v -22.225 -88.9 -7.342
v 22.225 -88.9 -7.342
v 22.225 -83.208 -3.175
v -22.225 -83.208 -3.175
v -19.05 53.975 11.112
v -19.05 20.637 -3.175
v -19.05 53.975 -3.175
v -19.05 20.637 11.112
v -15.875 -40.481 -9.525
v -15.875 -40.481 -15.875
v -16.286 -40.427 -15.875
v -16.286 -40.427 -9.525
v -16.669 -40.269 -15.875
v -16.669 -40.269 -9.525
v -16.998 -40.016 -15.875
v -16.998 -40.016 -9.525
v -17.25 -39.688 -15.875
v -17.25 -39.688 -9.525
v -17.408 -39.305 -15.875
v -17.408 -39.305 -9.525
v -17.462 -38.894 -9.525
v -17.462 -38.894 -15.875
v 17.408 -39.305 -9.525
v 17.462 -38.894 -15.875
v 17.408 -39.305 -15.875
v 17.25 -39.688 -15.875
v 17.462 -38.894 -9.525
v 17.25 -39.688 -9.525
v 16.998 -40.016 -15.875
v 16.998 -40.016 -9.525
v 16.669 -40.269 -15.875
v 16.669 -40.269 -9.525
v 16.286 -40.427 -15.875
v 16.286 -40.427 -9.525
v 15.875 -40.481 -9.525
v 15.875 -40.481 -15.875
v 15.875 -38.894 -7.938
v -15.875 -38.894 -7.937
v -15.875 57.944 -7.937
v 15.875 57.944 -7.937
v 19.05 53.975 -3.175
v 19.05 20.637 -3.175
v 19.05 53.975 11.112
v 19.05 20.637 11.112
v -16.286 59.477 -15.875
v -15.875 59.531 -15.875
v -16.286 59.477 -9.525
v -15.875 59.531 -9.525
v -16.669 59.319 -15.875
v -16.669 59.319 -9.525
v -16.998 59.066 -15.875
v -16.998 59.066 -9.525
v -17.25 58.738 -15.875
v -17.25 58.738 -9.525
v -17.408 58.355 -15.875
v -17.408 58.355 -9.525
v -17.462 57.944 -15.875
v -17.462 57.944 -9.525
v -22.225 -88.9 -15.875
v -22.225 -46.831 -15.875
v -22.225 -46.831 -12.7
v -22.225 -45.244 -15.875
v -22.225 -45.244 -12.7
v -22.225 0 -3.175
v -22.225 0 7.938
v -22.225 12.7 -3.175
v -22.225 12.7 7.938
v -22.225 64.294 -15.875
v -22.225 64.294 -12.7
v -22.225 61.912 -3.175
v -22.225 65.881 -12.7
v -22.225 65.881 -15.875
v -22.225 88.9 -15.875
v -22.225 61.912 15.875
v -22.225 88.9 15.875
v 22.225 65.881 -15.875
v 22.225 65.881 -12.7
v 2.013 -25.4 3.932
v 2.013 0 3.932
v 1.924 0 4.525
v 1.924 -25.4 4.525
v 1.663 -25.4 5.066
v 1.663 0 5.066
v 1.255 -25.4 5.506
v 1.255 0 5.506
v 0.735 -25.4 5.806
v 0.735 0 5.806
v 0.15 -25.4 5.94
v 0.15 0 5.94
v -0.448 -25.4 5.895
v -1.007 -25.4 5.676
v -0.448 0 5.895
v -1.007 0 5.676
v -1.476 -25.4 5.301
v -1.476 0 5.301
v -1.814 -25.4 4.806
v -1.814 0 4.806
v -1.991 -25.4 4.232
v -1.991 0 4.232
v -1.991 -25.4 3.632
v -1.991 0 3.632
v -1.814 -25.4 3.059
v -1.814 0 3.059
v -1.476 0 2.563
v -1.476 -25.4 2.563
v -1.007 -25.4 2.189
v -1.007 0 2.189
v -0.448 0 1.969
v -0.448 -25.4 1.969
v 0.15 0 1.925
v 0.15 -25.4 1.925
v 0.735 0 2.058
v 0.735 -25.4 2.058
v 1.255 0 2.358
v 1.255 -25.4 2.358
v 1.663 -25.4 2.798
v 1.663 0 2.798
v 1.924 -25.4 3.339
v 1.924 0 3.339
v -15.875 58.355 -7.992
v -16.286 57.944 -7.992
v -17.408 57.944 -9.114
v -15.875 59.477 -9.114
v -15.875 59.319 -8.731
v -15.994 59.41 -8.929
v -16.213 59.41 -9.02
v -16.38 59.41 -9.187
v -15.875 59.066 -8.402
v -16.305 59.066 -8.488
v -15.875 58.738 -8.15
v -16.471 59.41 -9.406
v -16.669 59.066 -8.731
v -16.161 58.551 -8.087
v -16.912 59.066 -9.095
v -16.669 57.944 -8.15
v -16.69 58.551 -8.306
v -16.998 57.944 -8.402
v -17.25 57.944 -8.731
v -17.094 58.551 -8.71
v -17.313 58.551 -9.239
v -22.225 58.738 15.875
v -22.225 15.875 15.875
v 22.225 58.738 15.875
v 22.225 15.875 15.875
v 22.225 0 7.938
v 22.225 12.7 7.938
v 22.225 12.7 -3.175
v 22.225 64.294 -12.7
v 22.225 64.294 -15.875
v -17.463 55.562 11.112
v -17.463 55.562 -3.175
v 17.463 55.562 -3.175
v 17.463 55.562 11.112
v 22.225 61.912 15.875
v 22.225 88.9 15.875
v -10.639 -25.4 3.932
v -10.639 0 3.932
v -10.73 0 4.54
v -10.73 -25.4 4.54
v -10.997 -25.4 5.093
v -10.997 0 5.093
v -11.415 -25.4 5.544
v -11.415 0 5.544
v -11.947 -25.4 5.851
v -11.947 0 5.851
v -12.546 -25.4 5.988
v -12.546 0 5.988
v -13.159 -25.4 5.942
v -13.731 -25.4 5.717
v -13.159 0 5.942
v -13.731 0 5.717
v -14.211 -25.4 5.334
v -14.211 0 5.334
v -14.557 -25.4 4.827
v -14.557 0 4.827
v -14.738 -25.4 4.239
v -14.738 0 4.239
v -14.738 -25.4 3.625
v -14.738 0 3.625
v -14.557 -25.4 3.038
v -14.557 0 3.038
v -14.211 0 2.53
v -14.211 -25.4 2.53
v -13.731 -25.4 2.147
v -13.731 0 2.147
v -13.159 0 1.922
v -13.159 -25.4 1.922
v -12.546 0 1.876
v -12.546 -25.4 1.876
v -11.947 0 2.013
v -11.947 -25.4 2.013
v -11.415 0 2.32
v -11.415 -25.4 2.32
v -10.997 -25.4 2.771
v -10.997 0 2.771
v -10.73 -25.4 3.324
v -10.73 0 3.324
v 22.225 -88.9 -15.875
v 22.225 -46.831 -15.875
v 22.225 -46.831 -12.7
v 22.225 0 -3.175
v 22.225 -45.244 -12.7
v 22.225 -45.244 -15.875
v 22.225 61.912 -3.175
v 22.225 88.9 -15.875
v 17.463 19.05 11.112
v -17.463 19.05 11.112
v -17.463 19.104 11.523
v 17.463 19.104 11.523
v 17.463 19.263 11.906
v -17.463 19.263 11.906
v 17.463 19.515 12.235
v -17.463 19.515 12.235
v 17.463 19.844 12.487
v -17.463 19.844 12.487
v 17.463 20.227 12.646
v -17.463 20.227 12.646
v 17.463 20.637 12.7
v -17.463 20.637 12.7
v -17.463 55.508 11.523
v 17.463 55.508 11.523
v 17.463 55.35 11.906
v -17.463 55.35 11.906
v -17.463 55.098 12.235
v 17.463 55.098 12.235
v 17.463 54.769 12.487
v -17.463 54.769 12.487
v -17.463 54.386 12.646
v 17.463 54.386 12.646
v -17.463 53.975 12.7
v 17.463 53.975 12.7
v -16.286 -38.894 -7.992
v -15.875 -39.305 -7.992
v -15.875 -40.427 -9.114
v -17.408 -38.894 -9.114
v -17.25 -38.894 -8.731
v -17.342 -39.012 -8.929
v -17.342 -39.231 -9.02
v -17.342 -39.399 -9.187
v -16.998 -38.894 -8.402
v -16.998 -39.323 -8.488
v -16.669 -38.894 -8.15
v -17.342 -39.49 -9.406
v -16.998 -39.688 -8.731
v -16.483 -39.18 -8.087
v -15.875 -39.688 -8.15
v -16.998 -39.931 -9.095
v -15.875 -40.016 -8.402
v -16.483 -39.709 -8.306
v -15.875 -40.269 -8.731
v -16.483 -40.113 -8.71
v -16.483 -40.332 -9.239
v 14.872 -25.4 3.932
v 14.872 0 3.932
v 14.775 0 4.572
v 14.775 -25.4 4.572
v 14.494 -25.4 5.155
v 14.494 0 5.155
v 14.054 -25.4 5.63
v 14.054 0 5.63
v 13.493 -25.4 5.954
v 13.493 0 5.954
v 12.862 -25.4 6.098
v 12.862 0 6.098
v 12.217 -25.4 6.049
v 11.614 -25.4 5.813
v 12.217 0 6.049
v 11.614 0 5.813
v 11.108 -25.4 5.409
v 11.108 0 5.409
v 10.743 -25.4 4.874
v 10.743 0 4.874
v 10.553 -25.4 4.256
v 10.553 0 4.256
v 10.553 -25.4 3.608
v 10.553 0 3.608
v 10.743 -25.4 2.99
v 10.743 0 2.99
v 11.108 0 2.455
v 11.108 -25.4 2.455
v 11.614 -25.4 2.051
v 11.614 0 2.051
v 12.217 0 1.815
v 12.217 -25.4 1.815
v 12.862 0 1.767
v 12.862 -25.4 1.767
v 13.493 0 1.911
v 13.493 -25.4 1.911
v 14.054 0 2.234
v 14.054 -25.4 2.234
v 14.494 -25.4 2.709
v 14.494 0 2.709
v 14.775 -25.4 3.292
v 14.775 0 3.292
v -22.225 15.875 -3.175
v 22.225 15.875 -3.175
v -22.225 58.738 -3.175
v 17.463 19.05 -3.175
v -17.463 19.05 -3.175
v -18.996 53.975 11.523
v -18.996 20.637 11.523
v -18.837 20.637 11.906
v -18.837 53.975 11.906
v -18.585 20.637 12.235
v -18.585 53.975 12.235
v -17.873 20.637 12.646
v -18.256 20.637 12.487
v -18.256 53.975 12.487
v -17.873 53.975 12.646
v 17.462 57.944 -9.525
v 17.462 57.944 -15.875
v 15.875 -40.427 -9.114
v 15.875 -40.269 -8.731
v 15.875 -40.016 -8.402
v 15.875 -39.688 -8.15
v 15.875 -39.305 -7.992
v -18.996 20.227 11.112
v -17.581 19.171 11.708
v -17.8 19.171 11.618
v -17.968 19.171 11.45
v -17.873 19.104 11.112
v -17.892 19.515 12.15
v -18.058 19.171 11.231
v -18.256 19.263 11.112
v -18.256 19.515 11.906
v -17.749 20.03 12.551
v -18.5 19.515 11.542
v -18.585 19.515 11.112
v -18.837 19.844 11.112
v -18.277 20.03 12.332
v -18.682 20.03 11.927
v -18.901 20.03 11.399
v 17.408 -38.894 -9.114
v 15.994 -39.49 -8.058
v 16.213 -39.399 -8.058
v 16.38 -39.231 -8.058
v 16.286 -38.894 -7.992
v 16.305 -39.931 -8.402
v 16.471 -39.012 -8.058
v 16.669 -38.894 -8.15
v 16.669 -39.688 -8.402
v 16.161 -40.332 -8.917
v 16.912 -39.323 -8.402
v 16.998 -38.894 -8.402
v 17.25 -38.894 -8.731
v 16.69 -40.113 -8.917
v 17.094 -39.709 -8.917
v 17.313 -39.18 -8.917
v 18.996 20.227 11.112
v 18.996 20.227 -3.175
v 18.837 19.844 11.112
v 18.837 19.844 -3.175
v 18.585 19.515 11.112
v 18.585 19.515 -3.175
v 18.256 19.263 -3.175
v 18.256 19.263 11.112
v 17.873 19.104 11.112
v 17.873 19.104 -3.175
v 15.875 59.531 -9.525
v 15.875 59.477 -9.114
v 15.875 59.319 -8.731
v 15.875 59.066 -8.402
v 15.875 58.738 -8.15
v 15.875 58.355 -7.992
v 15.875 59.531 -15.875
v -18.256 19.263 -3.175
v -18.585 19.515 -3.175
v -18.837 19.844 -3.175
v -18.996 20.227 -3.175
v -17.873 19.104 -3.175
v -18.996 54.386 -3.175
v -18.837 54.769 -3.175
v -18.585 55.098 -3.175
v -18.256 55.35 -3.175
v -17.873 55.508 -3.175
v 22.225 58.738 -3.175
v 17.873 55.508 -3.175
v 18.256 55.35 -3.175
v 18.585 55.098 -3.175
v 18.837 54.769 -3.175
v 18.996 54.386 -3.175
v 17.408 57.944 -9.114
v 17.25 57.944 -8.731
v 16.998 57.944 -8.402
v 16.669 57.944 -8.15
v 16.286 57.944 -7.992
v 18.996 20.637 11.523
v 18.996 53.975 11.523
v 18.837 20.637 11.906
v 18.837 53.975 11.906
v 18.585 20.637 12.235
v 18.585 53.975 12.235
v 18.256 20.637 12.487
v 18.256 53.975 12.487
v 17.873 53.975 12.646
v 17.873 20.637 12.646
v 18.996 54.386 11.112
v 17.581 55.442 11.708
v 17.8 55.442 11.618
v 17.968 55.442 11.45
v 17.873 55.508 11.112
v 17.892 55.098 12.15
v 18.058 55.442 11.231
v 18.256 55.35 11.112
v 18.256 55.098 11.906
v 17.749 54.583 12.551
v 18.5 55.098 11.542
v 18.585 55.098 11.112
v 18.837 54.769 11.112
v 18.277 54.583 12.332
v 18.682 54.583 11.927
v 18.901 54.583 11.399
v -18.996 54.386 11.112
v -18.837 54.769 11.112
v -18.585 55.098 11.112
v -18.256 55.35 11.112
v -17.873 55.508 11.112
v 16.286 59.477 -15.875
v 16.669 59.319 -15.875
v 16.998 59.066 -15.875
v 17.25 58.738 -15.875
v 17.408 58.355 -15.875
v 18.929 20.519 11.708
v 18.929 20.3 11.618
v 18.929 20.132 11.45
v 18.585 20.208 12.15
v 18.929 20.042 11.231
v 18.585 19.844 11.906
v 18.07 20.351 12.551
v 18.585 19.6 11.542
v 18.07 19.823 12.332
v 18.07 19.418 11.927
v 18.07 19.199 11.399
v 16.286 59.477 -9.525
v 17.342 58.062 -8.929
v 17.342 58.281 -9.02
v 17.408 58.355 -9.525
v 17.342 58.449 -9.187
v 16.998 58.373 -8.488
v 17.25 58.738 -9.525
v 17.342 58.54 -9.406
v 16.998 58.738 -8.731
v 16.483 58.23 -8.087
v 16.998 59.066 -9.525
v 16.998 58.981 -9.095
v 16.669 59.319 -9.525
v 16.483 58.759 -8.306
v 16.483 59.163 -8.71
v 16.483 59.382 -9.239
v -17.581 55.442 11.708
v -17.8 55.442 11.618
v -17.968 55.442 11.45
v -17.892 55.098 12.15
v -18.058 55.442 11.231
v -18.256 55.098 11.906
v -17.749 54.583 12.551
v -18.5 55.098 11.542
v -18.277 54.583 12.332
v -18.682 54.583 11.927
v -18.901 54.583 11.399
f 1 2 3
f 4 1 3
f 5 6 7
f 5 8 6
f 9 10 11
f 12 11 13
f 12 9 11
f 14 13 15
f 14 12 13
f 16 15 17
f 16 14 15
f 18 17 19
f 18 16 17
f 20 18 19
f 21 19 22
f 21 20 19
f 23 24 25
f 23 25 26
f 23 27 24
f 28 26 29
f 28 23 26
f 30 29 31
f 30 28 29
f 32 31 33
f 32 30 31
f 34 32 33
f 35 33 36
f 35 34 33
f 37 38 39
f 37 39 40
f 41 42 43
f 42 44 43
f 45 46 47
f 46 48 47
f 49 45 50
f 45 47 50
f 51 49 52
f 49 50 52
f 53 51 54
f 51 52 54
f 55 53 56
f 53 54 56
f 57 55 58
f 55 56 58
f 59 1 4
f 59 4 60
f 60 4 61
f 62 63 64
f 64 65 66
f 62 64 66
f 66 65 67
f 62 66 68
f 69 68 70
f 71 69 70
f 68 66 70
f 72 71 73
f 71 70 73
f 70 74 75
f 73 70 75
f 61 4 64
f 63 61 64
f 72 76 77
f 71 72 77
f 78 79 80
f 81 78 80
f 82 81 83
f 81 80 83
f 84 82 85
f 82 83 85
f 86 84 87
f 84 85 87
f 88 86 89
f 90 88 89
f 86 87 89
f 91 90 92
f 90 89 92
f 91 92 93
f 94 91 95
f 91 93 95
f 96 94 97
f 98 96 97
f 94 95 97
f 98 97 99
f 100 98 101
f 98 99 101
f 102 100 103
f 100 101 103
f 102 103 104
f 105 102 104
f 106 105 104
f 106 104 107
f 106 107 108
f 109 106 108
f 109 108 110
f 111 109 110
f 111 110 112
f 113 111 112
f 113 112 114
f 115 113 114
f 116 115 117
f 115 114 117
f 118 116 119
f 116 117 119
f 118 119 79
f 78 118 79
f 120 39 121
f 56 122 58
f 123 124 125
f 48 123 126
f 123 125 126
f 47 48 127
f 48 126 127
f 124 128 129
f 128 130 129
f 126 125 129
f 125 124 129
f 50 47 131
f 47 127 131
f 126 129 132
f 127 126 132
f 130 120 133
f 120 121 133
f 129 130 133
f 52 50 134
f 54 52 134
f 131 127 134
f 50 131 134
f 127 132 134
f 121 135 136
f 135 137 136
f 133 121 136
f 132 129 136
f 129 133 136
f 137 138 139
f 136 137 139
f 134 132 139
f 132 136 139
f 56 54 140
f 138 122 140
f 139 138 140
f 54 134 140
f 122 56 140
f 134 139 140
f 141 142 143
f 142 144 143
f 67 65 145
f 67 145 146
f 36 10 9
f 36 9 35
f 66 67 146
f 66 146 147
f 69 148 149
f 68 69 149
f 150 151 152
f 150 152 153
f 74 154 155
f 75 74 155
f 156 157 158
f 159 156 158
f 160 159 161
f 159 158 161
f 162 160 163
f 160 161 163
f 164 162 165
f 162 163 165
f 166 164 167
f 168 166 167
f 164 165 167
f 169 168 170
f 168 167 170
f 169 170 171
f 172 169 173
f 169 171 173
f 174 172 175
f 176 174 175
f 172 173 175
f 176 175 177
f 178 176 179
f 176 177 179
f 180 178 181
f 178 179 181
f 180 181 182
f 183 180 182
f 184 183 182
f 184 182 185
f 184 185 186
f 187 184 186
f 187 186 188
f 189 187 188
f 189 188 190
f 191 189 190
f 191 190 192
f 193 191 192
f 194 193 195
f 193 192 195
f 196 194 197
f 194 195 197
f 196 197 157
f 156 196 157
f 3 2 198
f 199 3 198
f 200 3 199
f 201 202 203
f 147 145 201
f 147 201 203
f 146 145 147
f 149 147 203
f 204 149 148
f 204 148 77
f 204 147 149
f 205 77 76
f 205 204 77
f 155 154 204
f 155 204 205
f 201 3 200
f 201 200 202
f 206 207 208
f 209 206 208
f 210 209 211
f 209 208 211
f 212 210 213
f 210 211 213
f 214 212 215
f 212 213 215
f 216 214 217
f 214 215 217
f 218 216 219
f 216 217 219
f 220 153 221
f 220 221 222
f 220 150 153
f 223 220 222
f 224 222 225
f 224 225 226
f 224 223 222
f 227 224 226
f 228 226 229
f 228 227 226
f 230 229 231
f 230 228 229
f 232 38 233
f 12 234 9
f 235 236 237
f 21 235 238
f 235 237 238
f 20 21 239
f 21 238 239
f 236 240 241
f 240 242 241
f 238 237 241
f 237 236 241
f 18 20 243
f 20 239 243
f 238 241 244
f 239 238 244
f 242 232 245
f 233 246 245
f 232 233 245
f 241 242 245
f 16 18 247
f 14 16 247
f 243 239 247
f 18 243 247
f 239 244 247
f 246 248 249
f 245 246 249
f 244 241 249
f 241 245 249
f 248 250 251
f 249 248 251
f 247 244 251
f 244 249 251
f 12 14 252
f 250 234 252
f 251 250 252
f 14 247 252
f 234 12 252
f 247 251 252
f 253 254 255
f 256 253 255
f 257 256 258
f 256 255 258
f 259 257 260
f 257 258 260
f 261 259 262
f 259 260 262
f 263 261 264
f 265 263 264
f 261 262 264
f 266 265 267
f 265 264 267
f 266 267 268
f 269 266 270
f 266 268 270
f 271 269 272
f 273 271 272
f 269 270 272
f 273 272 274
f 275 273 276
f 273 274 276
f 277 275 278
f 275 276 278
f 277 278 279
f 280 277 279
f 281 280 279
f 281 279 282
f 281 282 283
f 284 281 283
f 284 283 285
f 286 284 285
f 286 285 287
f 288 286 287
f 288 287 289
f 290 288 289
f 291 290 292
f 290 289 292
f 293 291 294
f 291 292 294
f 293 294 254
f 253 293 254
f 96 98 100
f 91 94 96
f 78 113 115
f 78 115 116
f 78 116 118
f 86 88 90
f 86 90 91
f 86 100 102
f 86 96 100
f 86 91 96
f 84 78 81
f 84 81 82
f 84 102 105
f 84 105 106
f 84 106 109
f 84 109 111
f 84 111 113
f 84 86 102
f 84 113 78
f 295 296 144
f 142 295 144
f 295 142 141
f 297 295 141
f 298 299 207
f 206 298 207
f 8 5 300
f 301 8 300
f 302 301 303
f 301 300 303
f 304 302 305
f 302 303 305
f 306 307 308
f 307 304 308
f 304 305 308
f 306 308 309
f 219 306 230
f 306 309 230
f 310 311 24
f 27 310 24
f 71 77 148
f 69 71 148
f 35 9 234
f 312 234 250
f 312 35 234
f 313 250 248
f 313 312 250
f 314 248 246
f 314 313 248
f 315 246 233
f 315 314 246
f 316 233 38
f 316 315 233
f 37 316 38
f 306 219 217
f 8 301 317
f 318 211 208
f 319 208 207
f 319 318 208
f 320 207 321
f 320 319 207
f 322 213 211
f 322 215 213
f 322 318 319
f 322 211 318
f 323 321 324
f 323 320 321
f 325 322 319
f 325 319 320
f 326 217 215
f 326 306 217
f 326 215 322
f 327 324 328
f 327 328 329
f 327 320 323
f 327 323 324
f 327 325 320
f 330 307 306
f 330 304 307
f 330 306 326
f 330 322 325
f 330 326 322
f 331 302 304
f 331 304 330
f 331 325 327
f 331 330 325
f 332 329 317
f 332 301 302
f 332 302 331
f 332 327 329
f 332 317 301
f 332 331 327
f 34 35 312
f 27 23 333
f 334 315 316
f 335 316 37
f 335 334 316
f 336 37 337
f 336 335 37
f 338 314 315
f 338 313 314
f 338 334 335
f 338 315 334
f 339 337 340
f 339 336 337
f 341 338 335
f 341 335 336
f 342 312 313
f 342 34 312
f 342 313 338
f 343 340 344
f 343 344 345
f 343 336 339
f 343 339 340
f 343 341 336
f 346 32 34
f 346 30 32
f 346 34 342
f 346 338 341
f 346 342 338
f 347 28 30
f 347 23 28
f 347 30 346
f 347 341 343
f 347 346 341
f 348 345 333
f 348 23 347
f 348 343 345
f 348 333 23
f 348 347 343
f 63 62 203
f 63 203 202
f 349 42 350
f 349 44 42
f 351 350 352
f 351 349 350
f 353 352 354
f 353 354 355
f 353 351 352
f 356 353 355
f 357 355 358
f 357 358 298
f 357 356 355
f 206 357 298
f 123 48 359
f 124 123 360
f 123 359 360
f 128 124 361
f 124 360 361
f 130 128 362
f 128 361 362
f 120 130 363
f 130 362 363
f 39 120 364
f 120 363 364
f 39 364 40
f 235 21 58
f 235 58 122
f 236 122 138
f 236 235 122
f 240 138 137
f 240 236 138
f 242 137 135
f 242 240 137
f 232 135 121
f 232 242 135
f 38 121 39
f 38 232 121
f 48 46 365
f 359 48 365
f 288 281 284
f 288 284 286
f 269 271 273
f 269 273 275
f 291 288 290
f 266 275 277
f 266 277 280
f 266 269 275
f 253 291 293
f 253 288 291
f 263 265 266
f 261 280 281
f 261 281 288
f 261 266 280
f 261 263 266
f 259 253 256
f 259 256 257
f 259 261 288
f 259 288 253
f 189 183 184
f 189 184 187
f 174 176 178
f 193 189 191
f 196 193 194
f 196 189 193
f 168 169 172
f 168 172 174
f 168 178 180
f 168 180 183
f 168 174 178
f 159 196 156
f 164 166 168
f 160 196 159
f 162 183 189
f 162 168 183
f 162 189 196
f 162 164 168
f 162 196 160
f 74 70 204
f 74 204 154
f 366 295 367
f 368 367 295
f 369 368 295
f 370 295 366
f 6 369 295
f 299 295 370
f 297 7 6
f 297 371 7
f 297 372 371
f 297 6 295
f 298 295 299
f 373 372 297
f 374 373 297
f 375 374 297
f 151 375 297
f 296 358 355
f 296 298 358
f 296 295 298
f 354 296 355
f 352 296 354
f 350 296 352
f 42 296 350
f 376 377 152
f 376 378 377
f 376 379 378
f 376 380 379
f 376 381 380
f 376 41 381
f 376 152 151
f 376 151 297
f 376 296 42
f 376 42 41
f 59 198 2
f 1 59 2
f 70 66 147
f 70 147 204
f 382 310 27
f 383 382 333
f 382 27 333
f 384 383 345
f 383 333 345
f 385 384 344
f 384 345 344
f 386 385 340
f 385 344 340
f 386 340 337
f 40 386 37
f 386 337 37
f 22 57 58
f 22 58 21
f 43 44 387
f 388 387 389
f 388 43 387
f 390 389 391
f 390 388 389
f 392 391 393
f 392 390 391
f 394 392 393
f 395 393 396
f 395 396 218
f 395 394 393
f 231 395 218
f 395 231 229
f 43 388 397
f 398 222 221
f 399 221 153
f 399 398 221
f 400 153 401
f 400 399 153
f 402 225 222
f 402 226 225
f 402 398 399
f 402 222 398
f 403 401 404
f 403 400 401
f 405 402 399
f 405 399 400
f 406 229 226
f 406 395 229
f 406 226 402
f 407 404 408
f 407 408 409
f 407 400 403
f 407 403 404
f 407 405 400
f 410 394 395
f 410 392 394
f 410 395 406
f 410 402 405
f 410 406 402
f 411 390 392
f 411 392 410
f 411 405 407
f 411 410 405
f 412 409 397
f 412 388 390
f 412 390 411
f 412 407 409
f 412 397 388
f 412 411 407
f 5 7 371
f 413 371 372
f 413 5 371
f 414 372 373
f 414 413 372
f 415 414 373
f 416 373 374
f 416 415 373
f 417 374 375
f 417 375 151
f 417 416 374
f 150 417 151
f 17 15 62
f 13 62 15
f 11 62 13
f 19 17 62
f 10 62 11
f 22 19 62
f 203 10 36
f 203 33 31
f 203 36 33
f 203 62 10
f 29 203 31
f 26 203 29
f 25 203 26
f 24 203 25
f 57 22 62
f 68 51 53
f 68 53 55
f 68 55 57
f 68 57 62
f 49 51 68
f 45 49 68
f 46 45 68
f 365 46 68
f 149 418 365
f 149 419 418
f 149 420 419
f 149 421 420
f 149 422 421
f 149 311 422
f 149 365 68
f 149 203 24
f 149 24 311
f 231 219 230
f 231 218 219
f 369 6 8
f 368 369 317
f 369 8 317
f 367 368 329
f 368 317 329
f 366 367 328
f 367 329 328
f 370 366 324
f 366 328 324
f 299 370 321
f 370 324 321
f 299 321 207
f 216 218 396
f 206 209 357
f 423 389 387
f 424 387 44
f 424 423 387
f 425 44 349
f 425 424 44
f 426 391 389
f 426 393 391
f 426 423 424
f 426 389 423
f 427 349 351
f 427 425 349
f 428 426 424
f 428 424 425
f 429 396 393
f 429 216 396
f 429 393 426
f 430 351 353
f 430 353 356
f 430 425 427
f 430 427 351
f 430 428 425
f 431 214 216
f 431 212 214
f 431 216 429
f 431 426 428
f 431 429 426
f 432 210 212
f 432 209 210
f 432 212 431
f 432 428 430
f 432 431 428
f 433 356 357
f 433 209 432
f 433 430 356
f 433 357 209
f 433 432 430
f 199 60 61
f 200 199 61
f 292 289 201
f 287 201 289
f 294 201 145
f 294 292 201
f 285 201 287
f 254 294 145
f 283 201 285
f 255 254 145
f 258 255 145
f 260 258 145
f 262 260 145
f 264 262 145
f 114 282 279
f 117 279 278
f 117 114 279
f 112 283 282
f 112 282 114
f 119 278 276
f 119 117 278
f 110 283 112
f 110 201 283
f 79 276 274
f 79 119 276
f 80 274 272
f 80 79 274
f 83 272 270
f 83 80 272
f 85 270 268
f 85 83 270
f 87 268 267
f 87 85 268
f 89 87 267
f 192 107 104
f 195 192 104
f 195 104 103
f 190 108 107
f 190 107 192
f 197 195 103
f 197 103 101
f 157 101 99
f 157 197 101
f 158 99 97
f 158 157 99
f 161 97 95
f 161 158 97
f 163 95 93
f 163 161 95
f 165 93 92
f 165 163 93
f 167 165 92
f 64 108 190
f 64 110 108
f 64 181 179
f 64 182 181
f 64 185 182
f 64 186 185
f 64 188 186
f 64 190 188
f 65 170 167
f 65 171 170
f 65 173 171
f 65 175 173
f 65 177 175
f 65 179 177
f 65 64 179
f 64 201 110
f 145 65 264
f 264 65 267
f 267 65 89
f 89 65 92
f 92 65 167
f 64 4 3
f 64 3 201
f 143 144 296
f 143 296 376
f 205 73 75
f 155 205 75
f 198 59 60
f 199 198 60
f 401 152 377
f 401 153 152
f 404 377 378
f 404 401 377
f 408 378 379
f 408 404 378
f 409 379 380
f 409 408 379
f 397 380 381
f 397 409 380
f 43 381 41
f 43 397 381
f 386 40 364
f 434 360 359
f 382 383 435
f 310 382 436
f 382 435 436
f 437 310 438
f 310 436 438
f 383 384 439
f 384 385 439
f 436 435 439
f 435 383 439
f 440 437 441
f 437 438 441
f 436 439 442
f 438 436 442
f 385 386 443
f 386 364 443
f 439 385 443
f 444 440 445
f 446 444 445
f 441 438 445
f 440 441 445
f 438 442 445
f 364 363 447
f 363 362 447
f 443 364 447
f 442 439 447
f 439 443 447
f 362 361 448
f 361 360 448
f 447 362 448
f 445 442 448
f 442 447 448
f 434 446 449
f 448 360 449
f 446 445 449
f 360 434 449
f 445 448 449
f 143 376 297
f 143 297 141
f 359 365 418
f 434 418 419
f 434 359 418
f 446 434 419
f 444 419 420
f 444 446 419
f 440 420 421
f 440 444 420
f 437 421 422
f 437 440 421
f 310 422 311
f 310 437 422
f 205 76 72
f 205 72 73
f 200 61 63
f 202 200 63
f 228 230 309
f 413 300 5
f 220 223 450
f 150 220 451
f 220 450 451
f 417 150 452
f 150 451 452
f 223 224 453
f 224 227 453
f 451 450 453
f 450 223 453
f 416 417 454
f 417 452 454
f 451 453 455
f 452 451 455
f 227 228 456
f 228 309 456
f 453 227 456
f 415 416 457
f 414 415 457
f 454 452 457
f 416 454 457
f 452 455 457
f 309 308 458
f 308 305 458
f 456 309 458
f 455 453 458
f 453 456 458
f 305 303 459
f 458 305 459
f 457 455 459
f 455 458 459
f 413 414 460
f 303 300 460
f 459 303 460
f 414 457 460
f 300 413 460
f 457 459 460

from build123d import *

# Parameters (mm, degrees)
F0_W          = 177.8
F0_H          = 31.75
F1_DEPTH      = 22.225
F2_W          = 1.5875
F2_H          = 3.175
F3_DEPTH      = 25.4
F5_DEPTH      = 22.225
F5_DEPTH_BACK = 22.226
F6_W          = 42.8625
F6_H          = 19.05
F7_DEPTH      = 22.225
F7_DEPTH_BACK = 22.225
F8_R          = 2.013133
F8_R_2        = 2.061445
F8_R_3        = 2.171598
F9_DEPTH      = 25.4
F10_W         = 34.925
F10_H         = 100.0125
F11_DEPTH     = 7.9375
F12_R         = 1.5875
F13_W         = 36.5125
F13_H         = 15.875
F14_DEPTH     = 19.05
F15_R         = 1.5875


with BuildPart() as f1:
    # F0 (on Right) → F1 (new body, symmetric)
    with BuildSketch(Plane.YZ):
        Rectangle(F0_W, F0_H)
    extrude(amount=F1_DEPTH, both=True)

    # F2 (on Right) → F3 (cut, symmetric)
    with BuildSketch(Plane.YZ):
        with Locations((-46.0375, -14.2875)):
            Rectangle(F2_W, F2_H)
        Polygon((64.29375, -12.7), (64.29375, -15.875), (65.88125, -15.875), (65.88125, -12.7), (65.0875, -12.7), align=None)
    extrude(amount=F3_DEPTH, both=True, mode=Mode.SUBTRACT)

    # F4 (on Right) → F5 (cut, two sides)
    with BuildSketch(Plane.YZ) as f5_sk:
        Polygon((-88.9, 15.875), (-88.9, -7.341742), (-83.208287, -3.175), (0, -3.175), (0, 7.9375), (12.7, 7.9375), (12.7, -3.175), (61.9125, -3.175), (61.9125, 15.875), align=None)
    extrude(amount=F5_DEPTH, mode=Mode.SUBTRACT)
    extrude(f5_sk.sketch, amount=-F5_DEPTH_BACK, mode=Mode.SUBTRACT)

    # F8 (on face) → F9 (join)
    with BuildSketch(Plane.XZ):
        with Locations((0, 3.932115)):
            Circle(F8_R)
        with Locations((-12.7, 3.932115)):
            Circle(F8_R_2)
        with Locations((12.7, 3.932115)):
            Circle(F8_R_3)
    extrude(amount=F9_DEPTH)

    # F10 (on face) → F11 (cut)
    with BuildSketch(Plane(origin=(0, 0, -15.875), x_dir=(1, 0, 0), z_dir=(0, 0, -1))):
        with Locations((0, -9.525)):
            Rectangle(F10_W, F10_H)
    extrude(amount=-F11_DEPTH, mode=Mode.SUBTRACT)

    # F12
    f12_edges = [f1.edges().sort_by_distance(p)[0] for p in [
        (17.4625, -40.48125, -11.90625),
        (0, -40.48125, -7.9375),
        (-17.4625, 9.525, -7.9375),
        (0, 59.53125, -7.9375),
        (17.4625, 9.525, -7.9375),
        (17.4625, 59.53125, -11.90625),
        (-17.4625, 59.53125, -11.90625),
        (-17.4625, -40.48125, -11.90625),
    ]]
    fillet(f12_edges, radius=F12_R)


with BuildPart() as f7:
    # F6 (on Right) → F7 (new body, two sides)
    with BuildSketch(Plane.YZ) as f7_sk:
        with Locations((37.30625, 6.35)):
            Rectangle(F6_W, F6_H)
    extrude(amount=F7_DEPTH)
    extrude(f7_sk.sketch, amount=-F7_DEPTH_BACK)

    # F13 (on Right) → F14 (cut, symmetric)
    with BuildSketch(Plane.YZ):
        with Locations((37.30625, 4.7625)):
            Rectangle(F13_W, F13_H)
    extrude(amount=F14_DEPTH, both=True, mode=Mode.SUBTRACT)

    # F15
    f15_edges = [f7.edges().sort_by_distance(p)[0] for p in [
        (-19.05, 37.30625, 12.7),
        (0, 19.05, 12.7),
        (19.05, 37.30625, 12.7),
        (0, 55.5625, 12.7),
        (-19.05, 55.5625, 4.7625),
        (19.05, 55.5625, 4.7625),
        (19.05, 19.05, 4.7625),
        (-19.05, 19.05, 4.7625),
    ]]
    fillet(f15_edges, radius=F15_R)


solid = Compound([f1.part, f7.part])
